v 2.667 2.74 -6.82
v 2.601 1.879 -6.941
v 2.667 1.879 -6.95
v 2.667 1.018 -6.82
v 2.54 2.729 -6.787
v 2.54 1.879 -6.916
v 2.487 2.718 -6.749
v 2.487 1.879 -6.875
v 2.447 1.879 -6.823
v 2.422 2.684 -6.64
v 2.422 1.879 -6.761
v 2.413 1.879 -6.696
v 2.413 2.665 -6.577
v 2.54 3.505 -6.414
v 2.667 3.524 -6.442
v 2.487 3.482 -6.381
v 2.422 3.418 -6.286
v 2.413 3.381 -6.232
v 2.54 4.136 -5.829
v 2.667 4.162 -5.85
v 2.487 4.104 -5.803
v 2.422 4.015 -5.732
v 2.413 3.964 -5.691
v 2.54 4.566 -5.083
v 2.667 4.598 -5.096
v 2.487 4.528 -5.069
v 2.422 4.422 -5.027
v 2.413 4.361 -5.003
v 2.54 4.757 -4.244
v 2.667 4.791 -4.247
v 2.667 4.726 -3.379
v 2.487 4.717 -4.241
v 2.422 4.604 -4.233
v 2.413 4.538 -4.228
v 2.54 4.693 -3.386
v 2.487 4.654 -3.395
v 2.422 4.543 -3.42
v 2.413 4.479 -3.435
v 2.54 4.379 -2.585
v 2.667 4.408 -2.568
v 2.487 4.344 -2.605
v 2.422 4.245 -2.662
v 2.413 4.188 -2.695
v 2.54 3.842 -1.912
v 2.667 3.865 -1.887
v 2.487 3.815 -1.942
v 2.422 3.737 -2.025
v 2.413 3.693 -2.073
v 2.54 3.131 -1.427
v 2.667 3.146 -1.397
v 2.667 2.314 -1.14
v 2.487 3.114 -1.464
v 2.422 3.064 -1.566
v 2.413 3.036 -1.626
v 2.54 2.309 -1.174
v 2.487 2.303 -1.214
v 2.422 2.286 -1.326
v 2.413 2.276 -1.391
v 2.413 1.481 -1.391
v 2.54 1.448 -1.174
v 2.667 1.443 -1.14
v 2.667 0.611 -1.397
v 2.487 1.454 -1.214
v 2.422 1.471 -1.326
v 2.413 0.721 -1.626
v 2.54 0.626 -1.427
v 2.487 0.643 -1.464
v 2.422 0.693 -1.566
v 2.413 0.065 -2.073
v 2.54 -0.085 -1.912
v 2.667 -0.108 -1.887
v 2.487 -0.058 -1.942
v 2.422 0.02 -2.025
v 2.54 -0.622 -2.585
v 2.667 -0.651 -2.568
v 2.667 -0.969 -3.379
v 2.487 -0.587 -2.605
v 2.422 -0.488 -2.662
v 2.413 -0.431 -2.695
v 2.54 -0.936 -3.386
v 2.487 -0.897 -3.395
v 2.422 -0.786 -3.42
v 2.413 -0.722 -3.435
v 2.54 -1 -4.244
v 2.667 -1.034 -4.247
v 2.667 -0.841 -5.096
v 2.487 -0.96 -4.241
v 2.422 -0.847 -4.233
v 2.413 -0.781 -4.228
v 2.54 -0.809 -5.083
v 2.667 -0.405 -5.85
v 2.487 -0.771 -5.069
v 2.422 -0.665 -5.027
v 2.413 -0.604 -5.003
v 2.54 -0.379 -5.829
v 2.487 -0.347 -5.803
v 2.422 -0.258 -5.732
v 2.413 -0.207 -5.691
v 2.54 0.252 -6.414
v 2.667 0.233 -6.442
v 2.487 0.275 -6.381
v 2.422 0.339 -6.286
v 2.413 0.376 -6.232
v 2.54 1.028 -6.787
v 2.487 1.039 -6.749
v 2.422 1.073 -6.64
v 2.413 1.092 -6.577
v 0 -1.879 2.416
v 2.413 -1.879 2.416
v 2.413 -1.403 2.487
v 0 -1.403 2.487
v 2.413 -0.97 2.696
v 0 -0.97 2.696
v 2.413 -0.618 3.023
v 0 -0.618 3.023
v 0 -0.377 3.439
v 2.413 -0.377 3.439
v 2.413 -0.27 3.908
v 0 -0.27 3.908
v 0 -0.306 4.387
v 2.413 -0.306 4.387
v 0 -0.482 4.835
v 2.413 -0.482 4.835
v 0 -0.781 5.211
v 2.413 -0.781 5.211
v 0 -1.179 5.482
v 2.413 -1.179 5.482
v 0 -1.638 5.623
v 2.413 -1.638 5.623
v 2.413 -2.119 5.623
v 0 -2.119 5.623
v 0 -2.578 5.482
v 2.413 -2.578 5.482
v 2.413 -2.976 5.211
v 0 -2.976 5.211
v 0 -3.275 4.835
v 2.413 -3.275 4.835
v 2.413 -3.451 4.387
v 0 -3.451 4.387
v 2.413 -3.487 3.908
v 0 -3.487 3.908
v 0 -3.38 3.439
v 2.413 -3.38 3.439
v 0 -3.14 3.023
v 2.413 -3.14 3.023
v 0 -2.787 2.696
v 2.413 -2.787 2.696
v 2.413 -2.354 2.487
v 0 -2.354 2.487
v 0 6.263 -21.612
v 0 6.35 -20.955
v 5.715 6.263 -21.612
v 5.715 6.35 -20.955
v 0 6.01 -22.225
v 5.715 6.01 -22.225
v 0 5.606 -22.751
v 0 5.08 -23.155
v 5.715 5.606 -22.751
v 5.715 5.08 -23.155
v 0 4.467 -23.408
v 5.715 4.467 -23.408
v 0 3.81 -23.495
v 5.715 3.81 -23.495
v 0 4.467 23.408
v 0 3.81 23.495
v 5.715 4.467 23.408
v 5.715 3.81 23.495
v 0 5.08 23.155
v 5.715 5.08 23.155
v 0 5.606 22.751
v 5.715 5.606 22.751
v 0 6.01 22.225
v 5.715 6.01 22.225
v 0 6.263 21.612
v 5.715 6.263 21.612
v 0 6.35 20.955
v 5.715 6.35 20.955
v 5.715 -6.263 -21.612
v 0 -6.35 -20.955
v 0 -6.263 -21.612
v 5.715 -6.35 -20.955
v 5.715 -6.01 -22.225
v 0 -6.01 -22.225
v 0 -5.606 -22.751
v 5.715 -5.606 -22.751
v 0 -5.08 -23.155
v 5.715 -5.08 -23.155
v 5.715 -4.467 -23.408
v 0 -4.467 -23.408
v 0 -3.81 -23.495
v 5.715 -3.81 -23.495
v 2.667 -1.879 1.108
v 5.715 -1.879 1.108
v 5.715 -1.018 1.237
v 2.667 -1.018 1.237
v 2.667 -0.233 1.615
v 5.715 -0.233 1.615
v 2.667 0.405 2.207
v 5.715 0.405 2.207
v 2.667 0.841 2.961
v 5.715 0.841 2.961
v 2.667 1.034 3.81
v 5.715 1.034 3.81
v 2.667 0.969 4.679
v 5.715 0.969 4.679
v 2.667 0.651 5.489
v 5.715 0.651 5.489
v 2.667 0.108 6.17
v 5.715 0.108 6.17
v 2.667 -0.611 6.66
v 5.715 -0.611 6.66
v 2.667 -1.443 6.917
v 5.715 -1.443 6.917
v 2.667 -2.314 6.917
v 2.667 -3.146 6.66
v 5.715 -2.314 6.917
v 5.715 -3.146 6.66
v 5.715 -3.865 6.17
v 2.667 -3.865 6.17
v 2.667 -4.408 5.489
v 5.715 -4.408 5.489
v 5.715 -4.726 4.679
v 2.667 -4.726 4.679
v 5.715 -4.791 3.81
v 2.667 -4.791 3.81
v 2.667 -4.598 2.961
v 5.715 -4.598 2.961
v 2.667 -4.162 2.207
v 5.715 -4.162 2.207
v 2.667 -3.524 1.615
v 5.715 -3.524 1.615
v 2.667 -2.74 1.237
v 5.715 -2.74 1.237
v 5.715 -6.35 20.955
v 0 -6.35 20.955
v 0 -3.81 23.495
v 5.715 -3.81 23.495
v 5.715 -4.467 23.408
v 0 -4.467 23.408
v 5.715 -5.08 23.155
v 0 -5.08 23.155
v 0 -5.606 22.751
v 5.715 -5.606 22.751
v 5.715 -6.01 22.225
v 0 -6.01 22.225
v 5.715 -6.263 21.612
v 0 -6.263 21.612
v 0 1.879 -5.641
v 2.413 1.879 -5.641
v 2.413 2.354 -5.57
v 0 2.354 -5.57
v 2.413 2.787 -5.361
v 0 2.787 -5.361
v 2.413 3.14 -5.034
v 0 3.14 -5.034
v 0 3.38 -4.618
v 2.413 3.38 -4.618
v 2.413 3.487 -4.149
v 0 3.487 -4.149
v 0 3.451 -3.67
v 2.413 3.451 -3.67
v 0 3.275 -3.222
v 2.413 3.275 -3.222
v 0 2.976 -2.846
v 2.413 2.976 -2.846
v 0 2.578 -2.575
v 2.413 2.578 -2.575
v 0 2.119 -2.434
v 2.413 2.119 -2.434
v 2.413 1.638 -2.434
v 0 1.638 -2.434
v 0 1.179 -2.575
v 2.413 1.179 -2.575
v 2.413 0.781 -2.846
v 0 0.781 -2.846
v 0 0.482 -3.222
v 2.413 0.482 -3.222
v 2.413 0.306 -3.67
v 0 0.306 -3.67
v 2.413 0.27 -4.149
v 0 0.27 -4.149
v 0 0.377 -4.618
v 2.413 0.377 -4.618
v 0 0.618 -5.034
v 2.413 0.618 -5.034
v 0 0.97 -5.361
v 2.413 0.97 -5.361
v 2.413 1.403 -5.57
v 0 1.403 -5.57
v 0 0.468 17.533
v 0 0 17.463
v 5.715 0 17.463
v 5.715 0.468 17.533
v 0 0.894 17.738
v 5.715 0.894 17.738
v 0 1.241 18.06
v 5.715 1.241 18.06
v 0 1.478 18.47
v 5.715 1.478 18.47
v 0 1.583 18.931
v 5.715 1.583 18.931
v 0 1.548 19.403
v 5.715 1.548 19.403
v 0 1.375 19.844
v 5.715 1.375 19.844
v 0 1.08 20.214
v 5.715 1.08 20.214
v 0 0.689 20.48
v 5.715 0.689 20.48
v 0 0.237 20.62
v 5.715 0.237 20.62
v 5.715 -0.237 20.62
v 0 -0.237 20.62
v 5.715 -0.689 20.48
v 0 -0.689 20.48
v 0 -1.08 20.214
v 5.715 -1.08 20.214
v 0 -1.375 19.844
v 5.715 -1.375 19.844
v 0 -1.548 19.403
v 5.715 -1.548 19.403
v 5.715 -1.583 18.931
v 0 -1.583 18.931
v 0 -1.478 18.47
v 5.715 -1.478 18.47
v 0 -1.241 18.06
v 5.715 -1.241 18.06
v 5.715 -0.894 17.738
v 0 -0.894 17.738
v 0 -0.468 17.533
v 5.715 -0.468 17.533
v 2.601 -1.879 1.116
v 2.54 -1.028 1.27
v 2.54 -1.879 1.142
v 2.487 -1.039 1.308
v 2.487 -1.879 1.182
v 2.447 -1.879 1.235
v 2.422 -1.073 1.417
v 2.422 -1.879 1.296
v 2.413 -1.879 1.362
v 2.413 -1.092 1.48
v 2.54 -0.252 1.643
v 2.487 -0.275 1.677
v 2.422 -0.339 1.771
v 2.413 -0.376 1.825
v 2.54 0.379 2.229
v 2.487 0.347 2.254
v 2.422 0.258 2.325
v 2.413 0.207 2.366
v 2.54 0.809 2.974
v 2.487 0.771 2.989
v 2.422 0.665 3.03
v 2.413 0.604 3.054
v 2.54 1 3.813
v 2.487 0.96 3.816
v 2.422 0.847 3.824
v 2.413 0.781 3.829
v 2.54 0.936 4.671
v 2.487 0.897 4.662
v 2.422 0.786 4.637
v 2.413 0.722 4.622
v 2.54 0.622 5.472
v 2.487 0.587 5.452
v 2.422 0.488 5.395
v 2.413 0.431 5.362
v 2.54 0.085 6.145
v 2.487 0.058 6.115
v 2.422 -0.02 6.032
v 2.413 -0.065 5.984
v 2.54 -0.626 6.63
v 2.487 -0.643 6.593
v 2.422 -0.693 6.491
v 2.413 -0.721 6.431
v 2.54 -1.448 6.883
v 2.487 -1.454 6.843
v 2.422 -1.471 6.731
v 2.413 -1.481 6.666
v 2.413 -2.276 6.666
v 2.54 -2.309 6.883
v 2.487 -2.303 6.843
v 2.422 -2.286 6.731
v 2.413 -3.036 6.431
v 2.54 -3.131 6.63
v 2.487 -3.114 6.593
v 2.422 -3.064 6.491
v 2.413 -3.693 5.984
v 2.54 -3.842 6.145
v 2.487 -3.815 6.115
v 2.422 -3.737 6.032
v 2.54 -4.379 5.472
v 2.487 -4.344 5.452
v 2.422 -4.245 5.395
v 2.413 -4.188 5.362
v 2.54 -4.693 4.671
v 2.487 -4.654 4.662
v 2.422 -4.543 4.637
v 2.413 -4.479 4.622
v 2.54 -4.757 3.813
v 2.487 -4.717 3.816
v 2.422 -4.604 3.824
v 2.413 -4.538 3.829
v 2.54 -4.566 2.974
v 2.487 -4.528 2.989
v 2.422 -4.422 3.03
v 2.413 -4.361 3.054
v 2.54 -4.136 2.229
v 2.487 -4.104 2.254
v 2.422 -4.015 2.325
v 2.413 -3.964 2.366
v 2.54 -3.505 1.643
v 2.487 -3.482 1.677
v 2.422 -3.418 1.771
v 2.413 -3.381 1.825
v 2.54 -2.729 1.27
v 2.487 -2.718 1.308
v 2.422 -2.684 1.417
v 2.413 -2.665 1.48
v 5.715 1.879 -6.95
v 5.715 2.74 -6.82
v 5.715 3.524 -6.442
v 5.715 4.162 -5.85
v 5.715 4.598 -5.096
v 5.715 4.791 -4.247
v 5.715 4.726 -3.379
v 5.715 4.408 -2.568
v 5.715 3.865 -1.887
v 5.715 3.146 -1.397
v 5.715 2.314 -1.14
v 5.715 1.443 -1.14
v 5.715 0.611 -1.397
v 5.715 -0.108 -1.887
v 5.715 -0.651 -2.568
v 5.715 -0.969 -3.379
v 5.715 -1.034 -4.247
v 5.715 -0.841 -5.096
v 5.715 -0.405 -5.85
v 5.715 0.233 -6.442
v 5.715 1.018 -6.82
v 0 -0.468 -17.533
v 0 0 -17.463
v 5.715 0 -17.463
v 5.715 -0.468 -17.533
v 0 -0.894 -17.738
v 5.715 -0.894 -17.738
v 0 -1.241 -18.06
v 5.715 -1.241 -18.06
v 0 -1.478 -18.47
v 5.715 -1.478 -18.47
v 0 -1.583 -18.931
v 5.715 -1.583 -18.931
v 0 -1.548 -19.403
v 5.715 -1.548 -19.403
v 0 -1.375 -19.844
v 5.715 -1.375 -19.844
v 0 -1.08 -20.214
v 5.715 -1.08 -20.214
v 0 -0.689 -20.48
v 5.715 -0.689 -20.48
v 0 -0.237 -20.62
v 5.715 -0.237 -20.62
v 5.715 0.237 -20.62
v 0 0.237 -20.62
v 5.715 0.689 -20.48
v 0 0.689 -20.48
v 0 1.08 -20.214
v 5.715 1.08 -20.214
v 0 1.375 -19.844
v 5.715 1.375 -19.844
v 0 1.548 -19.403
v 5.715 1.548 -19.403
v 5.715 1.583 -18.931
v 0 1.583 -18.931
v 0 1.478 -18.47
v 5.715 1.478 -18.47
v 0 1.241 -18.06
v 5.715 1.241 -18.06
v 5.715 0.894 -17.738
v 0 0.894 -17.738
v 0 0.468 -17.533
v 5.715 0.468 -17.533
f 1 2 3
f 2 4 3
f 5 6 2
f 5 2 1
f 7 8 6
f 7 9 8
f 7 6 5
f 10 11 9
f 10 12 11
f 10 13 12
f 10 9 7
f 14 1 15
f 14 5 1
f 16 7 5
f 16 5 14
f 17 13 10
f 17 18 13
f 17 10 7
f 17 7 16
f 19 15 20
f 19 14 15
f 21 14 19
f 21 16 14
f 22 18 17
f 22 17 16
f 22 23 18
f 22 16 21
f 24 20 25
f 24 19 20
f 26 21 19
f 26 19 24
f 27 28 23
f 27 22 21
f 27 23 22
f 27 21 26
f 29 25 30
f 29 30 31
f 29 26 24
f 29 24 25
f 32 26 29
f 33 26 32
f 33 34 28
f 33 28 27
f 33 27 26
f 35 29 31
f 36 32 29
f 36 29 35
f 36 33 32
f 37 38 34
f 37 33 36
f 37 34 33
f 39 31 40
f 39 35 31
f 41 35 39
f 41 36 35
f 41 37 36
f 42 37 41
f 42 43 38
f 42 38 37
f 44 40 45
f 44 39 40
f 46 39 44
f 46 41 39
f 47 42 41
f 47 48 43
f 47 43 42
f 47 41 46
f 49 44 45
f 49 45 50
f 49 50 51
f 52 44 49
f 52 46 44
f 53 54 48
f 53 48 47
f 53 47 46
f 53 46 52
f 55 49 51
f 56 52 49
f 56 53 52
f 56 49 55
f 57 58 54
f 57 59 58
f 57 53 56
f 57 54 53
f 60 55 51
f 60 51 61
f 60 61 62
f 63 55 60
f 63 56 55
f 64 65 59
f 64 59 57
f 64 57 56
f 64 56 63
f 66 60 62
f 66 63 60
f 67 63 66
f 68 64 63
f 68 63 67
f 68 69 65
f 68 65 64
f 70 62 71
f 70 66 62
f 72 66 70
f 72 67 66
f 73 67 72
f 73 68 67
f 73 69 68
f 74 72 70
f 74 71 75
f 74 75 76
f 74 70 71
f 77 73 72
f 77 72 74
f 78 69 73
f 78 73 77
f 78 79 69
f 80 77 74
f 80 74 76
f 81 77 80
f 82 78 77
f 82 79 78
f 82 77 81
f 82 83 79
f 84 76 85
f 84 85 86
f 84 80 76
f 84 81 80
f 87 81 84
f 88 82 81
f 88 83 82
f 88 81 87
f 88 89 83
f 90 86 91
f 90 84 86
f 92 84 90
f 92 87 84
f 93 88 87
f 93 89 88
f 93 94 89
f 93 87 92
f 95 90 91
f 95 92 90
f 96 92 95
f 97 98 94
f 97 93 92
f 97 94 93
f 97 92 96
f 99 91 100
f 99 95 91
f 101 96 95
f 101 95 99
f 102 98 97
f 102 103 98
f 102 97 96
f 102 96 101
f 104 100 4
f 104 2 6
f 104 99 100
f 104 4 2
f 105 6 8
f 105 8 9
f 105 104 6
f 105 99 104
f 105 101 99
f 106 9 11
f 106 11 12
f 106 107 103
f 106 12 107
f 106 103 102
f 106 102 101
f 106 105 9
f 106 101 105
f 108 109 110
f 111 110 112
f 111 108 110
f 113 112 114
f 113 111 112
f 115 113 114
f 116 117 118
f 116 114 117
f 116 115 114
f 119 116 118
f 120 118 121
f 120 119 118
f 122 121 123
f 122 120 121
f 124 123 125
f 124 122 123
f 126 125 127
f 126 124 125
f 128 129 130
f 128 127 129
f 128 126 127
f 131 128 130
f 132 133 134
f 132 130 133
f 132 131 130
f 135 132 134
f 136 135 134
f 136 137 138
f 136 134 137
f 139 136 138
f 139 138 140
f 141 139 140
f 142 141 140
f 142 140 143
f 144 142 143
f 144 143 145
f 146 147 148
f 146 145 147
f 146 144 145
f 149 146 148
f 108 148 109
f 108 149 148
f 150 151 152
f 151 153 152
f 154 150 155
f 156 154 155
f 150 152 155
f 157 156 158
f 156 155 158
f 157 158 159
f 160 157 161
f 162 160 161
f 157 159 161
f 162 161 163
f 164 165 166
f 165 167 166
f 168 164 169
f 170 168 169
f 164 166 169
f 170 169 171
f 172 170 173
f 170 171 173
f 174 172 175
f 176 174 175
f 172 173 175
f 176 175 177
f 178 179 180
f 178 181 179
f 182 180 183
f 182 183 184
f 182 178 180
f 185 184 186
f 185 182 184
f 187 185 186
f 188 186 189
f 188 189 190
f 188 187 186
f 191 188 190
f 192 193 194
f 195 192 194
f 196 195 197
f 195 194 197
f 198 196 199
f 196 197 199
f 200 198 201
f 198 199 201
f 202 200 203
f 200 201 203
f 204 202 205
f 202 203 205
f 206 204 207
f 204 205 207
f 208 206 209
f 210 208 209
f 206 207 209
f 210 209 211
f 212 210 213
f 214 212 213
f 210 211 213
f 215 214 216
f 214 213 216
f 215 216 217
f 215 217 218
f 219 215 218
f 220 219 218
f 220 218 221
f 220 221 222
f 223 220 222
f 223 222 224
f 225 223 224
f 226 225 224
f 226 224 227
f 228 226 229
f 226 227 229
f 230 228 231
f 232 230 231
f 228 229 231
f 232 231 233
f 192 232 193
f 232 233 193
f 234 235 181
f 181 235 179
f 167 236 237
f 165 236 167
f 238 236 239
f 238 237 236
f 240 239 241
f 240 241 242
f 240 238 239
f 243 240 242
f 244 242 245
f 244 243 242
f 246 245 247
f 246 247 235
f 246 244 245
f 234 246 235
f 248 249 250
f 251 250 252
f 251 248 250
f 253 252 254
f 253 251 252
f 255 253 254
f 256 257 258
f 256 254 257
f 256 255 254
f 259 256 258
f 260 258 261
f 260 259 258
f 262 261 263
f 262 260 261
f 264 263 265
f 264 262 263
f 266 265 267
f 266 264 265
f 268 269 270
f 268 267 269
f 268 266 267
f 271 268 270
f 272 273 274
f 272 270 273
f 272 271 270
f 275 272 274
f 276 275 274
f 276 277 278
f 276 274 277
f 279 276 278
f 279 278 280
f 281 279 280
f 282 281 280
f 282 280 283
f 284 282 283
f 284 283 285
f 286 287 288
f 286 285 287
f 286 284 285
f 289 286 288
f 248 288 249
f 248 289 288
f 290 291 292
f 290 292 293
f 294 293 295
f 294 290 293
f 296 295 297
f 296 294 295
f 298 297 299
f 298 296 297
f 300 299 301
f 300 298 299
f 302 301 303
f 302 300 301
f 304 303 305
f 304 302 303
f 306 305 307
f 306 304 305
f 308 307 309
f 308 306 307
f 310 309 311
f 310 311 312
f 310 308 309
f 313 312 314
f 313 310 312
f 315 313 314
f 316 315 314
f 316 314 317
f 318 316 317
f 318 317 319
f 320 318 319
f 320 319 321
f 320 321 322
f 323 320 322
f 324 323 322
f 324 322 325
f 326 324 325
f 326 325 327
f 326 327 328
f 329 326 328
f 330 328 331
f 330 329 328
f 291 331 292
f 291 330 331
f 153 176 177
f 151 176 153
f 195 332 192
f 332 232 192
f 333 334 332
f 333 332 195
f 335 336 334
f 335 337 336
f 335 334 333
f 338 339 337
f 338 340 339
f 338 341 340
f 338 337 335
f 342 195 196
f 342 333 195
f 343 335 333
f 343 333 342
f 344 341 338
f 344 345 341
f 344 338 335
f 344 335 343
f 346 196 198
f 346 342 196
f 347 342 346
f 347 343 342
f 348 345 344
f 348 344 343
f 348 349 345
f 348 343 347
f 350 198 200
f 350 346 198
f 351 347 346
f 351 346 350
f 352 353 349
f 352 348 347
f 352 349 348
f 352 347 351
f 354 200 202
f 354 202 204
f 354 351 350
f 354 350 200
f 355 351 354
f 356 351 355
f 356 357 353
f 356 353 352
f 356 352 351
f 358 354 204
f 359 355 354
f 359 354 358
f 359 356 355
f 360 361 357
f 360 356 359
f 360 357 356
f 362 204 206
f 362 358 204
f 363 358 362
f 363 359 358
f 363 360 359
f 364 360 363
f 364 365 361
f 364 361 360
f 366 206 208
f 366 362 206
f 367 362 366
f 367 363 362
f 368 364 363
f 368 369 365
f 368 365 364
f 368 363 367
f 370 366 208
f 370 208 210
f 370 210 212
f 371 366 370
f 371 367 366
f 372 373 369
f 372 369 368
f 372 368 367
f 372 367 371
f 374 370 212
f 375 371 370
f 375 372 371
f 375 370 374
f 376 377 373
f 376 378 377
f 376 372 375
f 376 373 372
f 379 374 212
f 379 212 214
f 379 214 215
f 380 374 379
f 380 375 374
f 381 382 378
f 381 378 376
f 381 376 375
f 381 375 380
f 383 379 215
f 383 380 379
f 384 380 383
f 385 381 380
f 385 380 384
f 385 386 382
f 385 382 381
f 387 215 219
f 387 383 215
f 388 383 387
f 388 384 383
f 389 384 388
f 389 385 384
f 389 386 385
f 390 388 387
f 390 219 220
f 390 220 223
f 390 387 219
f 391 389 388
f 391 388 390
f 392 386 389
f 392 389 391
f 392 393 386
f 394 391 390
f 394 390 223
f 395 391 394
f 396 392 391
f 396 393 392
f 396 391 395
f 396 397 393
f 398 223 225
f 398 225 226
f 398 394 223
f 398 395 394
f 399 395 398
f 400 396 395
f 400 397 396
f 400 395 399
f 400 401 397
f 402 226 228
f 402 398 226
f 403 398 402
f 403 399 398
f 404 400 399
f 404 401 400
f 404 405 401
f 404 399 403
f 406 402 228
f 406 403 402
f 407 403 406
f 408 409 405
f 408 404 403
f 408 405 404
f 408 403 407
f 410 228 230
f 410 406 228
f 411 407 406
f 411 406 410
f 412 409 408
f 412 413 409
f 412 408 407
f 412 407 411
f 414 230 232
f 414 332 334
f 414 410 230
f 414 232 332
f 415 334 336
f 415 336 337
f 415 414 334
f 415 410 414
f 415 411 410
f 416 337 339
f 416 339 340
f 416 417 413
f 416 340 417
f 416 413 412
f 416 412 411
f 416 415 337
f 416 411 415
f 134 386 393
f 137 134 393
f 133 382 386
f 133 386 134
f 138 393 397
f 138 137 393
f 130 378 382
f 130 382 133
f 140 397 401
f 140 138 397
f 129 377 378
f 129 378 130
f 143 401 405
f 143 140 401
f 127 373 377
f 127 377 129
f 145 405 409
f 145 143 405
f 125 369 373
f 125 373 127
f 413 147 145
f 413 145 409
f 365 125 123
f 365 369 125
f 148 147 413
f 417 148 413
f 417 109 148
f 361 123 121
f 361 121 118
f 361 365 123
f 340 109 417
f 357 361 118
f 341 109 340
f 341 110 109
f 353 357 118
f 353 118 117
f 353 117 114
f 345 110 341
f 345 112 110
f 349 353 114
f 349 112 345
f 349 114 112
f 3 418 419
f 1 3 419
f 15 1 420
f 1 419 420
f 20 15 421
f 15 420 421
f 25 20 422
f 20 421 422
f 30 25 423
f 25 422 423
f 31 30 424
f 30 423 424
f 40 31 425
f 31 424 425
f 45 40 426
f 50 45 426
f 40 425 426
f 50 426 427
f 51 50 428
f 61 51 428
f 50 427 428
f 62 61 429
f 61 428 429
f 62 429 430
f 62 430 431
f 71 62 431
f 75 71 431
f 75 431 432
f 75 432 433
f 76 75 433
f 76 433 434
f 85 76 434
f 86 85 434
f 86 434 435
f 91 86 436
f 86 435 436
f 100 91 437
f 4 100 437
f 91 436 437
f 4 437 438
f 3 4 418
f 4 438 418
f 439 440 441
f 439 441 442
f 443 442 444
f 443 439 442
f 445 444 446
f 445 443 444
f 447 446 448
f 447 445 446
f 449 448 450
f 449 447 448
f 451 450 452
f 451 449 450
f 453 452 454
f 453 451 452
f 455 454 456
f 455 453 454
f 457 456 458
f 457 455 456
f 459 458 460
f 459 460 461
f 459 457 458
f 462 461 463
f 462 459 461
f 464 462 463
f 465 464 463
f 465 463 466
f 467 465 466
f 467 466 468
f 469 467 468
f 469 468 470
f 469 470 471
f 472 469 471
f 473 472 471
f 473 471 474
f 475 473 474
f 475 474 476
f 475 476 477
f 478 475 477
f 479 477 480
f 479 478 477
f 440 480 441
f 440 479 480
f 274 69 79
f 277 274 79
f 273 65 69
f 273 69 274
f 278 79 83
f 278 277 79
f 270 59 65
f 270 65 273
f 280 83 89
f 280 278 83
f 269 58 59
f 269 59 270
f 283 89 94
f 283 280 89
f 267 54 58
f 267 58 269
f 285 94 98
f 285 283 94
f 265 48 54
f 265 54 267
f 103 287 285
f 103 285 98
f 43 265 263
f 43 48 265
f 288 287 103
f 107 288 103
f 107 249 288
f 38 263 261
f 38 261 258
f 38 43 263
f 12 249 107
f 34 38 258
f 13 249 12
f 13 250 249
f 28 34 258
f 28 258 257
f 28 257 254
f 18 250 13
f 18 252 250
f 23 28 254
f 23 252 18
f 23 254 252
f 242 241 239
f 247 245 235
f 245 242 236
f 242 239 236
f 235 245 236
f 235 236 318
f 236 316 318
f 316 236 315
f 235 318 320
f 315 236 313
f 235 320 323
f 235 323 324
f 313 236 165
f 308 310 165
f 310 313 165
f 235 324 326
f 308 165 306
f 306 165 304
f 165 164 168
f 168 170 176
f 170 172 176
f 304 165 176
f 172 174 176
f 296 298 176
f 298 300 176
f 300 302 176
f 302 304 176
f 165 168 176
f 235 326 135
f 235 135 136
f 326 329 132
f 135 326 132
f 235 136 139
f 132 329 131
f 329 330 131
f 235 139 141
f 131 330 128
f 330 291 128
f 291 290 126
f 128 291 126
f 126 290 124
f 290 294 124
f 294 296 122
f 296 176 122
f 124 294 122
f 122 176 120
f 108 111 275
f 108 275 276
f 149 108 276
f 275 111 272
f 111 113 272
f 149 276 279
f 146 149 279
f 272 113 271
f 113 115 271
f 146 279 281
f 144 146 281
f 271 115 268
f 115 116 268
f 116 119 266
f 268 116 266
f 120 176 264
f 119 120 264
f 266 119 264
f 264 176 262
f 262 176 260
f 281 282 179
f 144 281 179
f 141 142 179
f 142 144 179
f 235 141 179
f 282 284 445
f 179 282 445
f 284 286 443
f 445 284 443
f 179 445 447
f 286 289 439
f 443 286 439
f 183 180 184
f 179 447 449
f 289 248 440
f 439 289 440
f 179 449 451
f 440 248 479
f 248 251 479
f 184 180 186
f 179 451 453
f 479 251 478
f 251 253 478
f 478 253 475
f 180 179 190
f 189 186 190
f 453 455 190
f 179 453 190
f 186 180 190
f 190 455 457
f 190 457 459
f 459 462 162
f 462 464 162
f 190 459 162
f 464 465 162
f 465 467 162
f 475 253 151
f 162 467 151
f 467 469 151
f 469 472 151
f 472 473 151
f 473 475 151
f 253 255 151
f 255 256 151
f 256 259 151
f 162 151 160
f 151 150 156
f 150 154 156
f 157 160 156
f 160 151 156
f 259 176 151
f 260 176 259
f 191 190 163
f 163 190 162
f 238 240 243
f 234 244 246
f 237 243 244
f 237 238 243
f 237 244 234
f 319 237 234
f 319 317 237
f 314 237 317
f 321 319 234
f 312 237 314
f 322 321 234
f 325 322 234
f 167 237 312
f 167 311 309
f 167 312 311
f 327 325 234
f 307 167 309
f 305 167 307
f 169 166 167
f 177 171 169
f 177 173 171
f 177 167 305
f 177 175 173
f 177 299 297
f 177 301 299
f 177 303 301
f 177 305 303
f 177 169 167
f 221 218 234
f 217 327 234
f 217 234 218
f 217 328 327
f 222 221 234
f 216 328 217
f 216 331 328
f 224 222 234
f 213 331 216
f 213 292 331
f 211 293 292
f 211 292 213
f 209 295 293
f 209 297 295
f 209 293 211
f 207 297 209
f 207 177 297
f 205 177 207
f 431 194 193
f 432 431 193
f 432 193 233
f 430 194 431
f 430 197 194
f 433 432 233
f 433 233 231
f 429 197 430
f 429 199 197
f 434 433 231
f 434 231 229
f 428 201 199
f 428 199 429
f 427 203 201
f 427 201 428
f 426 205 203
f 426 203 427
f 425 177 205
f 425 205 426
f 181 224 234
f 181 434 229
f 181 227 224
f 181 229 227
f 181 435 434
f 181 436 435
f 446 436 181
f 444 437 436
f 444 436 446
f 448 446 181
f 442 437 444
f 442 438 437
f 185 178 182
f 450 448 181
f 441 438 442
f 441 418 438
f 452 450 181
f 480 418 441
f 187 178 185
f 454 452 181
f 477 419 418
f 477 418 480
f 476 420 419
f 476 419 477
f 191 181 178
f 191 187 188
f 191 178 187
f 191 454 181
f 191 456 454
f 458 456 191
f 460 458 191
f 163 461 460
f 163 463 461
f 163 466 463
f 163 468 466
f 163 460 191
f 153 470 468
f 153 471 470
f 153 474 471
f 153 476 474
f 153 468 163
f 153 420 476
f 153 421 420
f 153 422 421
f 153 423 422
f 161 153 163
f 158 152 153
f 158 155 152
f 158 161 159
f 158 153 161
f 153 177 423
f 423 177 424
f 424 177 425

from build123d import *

# Parameters (mm, degrees)
SKETCH1_W           = 46.99
SKETCH1_H           = 12.7
SKETCH1_R           = 1.5875
SKETCH1_R_2         = 1.6129
BOSS_EXTRUDE1_DEPTH = 5.715
SKETCH2_R           = 2.921
CUT_EXTRUDE1_DEPTH  = 3.302
FILLET1_R           = 2.54
FILLET2_R           = 0.254


with BuildPart() as part:
    # Sketch1 → Boss-Extrude1 (new body)
    with BuildSketch(Plane(origin=(0, 0, 0), x_dir=(0, 0, -1), z_dir=(1, 0, 0))):
        Rectangle(SKETCH1_W, SKETCH1_H)
        with Locations((-19.05, 0)):
            Circle(SKETCH1_R, mode=Mode.SUBTRACT)
        with Locations(Location((19.05, 0, 0), (0, 0, 180))):
            Circle(SKETCH1_R, mode=Mode.SUBTRACT)
        with Locations((-4.028538113, -1.878538173)):
            Circle(SKETCH1_R_2, mode=Mode.SUBTRACT)
        with Locations((4.028538113, 1.878538173)):
            Circle(SKETCH1_R_2, mode=Mode.SUBTRACT)
    extrude(amount=BOSS_EXTRUDE1_DEPTH)

    # Sketch2 → Cut-Extrude1 (cut)
    with BuildSketch(Plane(origin=(5.715, 0, 0), x_dir=(0, 0, -1), z_dir=(1, 0, 0))):
        with Locations((-4.028538113, -1.878538173)):
            Circle(SKETCH2_R)
        with Locations((4.028538113, 1.878538173)):
            Circle(SKETCH2_R)
    extrude(amount=-CUT_EXTRUDE1_DEPTH, mode=Mode.SUBTRACT)

    # Fillet1
    fillet1_edges = [part.edges().sort_by_distance(p)[0] for p in [
        (2.8575, 6.35, 23.495),
        (2.8575, 6.35, -23.495),
        (2.8575, -6.35, -23.495),
        (2.8575, -6.35, 23.495),
    ]]
    fillet(fillet1_edges, radius=FILLET1_R)

    # Fillet2
    fillet2_edges = [part.edges().sort_by_distance(p)[0] for p in [
        (2.413, -1.878538173, 6.949538113),
        (2.413, 1.878538173, -1.107538113),
    ]]
    fillet(fillet2_edges, radius=FILLET2_R)


solid = part.part
